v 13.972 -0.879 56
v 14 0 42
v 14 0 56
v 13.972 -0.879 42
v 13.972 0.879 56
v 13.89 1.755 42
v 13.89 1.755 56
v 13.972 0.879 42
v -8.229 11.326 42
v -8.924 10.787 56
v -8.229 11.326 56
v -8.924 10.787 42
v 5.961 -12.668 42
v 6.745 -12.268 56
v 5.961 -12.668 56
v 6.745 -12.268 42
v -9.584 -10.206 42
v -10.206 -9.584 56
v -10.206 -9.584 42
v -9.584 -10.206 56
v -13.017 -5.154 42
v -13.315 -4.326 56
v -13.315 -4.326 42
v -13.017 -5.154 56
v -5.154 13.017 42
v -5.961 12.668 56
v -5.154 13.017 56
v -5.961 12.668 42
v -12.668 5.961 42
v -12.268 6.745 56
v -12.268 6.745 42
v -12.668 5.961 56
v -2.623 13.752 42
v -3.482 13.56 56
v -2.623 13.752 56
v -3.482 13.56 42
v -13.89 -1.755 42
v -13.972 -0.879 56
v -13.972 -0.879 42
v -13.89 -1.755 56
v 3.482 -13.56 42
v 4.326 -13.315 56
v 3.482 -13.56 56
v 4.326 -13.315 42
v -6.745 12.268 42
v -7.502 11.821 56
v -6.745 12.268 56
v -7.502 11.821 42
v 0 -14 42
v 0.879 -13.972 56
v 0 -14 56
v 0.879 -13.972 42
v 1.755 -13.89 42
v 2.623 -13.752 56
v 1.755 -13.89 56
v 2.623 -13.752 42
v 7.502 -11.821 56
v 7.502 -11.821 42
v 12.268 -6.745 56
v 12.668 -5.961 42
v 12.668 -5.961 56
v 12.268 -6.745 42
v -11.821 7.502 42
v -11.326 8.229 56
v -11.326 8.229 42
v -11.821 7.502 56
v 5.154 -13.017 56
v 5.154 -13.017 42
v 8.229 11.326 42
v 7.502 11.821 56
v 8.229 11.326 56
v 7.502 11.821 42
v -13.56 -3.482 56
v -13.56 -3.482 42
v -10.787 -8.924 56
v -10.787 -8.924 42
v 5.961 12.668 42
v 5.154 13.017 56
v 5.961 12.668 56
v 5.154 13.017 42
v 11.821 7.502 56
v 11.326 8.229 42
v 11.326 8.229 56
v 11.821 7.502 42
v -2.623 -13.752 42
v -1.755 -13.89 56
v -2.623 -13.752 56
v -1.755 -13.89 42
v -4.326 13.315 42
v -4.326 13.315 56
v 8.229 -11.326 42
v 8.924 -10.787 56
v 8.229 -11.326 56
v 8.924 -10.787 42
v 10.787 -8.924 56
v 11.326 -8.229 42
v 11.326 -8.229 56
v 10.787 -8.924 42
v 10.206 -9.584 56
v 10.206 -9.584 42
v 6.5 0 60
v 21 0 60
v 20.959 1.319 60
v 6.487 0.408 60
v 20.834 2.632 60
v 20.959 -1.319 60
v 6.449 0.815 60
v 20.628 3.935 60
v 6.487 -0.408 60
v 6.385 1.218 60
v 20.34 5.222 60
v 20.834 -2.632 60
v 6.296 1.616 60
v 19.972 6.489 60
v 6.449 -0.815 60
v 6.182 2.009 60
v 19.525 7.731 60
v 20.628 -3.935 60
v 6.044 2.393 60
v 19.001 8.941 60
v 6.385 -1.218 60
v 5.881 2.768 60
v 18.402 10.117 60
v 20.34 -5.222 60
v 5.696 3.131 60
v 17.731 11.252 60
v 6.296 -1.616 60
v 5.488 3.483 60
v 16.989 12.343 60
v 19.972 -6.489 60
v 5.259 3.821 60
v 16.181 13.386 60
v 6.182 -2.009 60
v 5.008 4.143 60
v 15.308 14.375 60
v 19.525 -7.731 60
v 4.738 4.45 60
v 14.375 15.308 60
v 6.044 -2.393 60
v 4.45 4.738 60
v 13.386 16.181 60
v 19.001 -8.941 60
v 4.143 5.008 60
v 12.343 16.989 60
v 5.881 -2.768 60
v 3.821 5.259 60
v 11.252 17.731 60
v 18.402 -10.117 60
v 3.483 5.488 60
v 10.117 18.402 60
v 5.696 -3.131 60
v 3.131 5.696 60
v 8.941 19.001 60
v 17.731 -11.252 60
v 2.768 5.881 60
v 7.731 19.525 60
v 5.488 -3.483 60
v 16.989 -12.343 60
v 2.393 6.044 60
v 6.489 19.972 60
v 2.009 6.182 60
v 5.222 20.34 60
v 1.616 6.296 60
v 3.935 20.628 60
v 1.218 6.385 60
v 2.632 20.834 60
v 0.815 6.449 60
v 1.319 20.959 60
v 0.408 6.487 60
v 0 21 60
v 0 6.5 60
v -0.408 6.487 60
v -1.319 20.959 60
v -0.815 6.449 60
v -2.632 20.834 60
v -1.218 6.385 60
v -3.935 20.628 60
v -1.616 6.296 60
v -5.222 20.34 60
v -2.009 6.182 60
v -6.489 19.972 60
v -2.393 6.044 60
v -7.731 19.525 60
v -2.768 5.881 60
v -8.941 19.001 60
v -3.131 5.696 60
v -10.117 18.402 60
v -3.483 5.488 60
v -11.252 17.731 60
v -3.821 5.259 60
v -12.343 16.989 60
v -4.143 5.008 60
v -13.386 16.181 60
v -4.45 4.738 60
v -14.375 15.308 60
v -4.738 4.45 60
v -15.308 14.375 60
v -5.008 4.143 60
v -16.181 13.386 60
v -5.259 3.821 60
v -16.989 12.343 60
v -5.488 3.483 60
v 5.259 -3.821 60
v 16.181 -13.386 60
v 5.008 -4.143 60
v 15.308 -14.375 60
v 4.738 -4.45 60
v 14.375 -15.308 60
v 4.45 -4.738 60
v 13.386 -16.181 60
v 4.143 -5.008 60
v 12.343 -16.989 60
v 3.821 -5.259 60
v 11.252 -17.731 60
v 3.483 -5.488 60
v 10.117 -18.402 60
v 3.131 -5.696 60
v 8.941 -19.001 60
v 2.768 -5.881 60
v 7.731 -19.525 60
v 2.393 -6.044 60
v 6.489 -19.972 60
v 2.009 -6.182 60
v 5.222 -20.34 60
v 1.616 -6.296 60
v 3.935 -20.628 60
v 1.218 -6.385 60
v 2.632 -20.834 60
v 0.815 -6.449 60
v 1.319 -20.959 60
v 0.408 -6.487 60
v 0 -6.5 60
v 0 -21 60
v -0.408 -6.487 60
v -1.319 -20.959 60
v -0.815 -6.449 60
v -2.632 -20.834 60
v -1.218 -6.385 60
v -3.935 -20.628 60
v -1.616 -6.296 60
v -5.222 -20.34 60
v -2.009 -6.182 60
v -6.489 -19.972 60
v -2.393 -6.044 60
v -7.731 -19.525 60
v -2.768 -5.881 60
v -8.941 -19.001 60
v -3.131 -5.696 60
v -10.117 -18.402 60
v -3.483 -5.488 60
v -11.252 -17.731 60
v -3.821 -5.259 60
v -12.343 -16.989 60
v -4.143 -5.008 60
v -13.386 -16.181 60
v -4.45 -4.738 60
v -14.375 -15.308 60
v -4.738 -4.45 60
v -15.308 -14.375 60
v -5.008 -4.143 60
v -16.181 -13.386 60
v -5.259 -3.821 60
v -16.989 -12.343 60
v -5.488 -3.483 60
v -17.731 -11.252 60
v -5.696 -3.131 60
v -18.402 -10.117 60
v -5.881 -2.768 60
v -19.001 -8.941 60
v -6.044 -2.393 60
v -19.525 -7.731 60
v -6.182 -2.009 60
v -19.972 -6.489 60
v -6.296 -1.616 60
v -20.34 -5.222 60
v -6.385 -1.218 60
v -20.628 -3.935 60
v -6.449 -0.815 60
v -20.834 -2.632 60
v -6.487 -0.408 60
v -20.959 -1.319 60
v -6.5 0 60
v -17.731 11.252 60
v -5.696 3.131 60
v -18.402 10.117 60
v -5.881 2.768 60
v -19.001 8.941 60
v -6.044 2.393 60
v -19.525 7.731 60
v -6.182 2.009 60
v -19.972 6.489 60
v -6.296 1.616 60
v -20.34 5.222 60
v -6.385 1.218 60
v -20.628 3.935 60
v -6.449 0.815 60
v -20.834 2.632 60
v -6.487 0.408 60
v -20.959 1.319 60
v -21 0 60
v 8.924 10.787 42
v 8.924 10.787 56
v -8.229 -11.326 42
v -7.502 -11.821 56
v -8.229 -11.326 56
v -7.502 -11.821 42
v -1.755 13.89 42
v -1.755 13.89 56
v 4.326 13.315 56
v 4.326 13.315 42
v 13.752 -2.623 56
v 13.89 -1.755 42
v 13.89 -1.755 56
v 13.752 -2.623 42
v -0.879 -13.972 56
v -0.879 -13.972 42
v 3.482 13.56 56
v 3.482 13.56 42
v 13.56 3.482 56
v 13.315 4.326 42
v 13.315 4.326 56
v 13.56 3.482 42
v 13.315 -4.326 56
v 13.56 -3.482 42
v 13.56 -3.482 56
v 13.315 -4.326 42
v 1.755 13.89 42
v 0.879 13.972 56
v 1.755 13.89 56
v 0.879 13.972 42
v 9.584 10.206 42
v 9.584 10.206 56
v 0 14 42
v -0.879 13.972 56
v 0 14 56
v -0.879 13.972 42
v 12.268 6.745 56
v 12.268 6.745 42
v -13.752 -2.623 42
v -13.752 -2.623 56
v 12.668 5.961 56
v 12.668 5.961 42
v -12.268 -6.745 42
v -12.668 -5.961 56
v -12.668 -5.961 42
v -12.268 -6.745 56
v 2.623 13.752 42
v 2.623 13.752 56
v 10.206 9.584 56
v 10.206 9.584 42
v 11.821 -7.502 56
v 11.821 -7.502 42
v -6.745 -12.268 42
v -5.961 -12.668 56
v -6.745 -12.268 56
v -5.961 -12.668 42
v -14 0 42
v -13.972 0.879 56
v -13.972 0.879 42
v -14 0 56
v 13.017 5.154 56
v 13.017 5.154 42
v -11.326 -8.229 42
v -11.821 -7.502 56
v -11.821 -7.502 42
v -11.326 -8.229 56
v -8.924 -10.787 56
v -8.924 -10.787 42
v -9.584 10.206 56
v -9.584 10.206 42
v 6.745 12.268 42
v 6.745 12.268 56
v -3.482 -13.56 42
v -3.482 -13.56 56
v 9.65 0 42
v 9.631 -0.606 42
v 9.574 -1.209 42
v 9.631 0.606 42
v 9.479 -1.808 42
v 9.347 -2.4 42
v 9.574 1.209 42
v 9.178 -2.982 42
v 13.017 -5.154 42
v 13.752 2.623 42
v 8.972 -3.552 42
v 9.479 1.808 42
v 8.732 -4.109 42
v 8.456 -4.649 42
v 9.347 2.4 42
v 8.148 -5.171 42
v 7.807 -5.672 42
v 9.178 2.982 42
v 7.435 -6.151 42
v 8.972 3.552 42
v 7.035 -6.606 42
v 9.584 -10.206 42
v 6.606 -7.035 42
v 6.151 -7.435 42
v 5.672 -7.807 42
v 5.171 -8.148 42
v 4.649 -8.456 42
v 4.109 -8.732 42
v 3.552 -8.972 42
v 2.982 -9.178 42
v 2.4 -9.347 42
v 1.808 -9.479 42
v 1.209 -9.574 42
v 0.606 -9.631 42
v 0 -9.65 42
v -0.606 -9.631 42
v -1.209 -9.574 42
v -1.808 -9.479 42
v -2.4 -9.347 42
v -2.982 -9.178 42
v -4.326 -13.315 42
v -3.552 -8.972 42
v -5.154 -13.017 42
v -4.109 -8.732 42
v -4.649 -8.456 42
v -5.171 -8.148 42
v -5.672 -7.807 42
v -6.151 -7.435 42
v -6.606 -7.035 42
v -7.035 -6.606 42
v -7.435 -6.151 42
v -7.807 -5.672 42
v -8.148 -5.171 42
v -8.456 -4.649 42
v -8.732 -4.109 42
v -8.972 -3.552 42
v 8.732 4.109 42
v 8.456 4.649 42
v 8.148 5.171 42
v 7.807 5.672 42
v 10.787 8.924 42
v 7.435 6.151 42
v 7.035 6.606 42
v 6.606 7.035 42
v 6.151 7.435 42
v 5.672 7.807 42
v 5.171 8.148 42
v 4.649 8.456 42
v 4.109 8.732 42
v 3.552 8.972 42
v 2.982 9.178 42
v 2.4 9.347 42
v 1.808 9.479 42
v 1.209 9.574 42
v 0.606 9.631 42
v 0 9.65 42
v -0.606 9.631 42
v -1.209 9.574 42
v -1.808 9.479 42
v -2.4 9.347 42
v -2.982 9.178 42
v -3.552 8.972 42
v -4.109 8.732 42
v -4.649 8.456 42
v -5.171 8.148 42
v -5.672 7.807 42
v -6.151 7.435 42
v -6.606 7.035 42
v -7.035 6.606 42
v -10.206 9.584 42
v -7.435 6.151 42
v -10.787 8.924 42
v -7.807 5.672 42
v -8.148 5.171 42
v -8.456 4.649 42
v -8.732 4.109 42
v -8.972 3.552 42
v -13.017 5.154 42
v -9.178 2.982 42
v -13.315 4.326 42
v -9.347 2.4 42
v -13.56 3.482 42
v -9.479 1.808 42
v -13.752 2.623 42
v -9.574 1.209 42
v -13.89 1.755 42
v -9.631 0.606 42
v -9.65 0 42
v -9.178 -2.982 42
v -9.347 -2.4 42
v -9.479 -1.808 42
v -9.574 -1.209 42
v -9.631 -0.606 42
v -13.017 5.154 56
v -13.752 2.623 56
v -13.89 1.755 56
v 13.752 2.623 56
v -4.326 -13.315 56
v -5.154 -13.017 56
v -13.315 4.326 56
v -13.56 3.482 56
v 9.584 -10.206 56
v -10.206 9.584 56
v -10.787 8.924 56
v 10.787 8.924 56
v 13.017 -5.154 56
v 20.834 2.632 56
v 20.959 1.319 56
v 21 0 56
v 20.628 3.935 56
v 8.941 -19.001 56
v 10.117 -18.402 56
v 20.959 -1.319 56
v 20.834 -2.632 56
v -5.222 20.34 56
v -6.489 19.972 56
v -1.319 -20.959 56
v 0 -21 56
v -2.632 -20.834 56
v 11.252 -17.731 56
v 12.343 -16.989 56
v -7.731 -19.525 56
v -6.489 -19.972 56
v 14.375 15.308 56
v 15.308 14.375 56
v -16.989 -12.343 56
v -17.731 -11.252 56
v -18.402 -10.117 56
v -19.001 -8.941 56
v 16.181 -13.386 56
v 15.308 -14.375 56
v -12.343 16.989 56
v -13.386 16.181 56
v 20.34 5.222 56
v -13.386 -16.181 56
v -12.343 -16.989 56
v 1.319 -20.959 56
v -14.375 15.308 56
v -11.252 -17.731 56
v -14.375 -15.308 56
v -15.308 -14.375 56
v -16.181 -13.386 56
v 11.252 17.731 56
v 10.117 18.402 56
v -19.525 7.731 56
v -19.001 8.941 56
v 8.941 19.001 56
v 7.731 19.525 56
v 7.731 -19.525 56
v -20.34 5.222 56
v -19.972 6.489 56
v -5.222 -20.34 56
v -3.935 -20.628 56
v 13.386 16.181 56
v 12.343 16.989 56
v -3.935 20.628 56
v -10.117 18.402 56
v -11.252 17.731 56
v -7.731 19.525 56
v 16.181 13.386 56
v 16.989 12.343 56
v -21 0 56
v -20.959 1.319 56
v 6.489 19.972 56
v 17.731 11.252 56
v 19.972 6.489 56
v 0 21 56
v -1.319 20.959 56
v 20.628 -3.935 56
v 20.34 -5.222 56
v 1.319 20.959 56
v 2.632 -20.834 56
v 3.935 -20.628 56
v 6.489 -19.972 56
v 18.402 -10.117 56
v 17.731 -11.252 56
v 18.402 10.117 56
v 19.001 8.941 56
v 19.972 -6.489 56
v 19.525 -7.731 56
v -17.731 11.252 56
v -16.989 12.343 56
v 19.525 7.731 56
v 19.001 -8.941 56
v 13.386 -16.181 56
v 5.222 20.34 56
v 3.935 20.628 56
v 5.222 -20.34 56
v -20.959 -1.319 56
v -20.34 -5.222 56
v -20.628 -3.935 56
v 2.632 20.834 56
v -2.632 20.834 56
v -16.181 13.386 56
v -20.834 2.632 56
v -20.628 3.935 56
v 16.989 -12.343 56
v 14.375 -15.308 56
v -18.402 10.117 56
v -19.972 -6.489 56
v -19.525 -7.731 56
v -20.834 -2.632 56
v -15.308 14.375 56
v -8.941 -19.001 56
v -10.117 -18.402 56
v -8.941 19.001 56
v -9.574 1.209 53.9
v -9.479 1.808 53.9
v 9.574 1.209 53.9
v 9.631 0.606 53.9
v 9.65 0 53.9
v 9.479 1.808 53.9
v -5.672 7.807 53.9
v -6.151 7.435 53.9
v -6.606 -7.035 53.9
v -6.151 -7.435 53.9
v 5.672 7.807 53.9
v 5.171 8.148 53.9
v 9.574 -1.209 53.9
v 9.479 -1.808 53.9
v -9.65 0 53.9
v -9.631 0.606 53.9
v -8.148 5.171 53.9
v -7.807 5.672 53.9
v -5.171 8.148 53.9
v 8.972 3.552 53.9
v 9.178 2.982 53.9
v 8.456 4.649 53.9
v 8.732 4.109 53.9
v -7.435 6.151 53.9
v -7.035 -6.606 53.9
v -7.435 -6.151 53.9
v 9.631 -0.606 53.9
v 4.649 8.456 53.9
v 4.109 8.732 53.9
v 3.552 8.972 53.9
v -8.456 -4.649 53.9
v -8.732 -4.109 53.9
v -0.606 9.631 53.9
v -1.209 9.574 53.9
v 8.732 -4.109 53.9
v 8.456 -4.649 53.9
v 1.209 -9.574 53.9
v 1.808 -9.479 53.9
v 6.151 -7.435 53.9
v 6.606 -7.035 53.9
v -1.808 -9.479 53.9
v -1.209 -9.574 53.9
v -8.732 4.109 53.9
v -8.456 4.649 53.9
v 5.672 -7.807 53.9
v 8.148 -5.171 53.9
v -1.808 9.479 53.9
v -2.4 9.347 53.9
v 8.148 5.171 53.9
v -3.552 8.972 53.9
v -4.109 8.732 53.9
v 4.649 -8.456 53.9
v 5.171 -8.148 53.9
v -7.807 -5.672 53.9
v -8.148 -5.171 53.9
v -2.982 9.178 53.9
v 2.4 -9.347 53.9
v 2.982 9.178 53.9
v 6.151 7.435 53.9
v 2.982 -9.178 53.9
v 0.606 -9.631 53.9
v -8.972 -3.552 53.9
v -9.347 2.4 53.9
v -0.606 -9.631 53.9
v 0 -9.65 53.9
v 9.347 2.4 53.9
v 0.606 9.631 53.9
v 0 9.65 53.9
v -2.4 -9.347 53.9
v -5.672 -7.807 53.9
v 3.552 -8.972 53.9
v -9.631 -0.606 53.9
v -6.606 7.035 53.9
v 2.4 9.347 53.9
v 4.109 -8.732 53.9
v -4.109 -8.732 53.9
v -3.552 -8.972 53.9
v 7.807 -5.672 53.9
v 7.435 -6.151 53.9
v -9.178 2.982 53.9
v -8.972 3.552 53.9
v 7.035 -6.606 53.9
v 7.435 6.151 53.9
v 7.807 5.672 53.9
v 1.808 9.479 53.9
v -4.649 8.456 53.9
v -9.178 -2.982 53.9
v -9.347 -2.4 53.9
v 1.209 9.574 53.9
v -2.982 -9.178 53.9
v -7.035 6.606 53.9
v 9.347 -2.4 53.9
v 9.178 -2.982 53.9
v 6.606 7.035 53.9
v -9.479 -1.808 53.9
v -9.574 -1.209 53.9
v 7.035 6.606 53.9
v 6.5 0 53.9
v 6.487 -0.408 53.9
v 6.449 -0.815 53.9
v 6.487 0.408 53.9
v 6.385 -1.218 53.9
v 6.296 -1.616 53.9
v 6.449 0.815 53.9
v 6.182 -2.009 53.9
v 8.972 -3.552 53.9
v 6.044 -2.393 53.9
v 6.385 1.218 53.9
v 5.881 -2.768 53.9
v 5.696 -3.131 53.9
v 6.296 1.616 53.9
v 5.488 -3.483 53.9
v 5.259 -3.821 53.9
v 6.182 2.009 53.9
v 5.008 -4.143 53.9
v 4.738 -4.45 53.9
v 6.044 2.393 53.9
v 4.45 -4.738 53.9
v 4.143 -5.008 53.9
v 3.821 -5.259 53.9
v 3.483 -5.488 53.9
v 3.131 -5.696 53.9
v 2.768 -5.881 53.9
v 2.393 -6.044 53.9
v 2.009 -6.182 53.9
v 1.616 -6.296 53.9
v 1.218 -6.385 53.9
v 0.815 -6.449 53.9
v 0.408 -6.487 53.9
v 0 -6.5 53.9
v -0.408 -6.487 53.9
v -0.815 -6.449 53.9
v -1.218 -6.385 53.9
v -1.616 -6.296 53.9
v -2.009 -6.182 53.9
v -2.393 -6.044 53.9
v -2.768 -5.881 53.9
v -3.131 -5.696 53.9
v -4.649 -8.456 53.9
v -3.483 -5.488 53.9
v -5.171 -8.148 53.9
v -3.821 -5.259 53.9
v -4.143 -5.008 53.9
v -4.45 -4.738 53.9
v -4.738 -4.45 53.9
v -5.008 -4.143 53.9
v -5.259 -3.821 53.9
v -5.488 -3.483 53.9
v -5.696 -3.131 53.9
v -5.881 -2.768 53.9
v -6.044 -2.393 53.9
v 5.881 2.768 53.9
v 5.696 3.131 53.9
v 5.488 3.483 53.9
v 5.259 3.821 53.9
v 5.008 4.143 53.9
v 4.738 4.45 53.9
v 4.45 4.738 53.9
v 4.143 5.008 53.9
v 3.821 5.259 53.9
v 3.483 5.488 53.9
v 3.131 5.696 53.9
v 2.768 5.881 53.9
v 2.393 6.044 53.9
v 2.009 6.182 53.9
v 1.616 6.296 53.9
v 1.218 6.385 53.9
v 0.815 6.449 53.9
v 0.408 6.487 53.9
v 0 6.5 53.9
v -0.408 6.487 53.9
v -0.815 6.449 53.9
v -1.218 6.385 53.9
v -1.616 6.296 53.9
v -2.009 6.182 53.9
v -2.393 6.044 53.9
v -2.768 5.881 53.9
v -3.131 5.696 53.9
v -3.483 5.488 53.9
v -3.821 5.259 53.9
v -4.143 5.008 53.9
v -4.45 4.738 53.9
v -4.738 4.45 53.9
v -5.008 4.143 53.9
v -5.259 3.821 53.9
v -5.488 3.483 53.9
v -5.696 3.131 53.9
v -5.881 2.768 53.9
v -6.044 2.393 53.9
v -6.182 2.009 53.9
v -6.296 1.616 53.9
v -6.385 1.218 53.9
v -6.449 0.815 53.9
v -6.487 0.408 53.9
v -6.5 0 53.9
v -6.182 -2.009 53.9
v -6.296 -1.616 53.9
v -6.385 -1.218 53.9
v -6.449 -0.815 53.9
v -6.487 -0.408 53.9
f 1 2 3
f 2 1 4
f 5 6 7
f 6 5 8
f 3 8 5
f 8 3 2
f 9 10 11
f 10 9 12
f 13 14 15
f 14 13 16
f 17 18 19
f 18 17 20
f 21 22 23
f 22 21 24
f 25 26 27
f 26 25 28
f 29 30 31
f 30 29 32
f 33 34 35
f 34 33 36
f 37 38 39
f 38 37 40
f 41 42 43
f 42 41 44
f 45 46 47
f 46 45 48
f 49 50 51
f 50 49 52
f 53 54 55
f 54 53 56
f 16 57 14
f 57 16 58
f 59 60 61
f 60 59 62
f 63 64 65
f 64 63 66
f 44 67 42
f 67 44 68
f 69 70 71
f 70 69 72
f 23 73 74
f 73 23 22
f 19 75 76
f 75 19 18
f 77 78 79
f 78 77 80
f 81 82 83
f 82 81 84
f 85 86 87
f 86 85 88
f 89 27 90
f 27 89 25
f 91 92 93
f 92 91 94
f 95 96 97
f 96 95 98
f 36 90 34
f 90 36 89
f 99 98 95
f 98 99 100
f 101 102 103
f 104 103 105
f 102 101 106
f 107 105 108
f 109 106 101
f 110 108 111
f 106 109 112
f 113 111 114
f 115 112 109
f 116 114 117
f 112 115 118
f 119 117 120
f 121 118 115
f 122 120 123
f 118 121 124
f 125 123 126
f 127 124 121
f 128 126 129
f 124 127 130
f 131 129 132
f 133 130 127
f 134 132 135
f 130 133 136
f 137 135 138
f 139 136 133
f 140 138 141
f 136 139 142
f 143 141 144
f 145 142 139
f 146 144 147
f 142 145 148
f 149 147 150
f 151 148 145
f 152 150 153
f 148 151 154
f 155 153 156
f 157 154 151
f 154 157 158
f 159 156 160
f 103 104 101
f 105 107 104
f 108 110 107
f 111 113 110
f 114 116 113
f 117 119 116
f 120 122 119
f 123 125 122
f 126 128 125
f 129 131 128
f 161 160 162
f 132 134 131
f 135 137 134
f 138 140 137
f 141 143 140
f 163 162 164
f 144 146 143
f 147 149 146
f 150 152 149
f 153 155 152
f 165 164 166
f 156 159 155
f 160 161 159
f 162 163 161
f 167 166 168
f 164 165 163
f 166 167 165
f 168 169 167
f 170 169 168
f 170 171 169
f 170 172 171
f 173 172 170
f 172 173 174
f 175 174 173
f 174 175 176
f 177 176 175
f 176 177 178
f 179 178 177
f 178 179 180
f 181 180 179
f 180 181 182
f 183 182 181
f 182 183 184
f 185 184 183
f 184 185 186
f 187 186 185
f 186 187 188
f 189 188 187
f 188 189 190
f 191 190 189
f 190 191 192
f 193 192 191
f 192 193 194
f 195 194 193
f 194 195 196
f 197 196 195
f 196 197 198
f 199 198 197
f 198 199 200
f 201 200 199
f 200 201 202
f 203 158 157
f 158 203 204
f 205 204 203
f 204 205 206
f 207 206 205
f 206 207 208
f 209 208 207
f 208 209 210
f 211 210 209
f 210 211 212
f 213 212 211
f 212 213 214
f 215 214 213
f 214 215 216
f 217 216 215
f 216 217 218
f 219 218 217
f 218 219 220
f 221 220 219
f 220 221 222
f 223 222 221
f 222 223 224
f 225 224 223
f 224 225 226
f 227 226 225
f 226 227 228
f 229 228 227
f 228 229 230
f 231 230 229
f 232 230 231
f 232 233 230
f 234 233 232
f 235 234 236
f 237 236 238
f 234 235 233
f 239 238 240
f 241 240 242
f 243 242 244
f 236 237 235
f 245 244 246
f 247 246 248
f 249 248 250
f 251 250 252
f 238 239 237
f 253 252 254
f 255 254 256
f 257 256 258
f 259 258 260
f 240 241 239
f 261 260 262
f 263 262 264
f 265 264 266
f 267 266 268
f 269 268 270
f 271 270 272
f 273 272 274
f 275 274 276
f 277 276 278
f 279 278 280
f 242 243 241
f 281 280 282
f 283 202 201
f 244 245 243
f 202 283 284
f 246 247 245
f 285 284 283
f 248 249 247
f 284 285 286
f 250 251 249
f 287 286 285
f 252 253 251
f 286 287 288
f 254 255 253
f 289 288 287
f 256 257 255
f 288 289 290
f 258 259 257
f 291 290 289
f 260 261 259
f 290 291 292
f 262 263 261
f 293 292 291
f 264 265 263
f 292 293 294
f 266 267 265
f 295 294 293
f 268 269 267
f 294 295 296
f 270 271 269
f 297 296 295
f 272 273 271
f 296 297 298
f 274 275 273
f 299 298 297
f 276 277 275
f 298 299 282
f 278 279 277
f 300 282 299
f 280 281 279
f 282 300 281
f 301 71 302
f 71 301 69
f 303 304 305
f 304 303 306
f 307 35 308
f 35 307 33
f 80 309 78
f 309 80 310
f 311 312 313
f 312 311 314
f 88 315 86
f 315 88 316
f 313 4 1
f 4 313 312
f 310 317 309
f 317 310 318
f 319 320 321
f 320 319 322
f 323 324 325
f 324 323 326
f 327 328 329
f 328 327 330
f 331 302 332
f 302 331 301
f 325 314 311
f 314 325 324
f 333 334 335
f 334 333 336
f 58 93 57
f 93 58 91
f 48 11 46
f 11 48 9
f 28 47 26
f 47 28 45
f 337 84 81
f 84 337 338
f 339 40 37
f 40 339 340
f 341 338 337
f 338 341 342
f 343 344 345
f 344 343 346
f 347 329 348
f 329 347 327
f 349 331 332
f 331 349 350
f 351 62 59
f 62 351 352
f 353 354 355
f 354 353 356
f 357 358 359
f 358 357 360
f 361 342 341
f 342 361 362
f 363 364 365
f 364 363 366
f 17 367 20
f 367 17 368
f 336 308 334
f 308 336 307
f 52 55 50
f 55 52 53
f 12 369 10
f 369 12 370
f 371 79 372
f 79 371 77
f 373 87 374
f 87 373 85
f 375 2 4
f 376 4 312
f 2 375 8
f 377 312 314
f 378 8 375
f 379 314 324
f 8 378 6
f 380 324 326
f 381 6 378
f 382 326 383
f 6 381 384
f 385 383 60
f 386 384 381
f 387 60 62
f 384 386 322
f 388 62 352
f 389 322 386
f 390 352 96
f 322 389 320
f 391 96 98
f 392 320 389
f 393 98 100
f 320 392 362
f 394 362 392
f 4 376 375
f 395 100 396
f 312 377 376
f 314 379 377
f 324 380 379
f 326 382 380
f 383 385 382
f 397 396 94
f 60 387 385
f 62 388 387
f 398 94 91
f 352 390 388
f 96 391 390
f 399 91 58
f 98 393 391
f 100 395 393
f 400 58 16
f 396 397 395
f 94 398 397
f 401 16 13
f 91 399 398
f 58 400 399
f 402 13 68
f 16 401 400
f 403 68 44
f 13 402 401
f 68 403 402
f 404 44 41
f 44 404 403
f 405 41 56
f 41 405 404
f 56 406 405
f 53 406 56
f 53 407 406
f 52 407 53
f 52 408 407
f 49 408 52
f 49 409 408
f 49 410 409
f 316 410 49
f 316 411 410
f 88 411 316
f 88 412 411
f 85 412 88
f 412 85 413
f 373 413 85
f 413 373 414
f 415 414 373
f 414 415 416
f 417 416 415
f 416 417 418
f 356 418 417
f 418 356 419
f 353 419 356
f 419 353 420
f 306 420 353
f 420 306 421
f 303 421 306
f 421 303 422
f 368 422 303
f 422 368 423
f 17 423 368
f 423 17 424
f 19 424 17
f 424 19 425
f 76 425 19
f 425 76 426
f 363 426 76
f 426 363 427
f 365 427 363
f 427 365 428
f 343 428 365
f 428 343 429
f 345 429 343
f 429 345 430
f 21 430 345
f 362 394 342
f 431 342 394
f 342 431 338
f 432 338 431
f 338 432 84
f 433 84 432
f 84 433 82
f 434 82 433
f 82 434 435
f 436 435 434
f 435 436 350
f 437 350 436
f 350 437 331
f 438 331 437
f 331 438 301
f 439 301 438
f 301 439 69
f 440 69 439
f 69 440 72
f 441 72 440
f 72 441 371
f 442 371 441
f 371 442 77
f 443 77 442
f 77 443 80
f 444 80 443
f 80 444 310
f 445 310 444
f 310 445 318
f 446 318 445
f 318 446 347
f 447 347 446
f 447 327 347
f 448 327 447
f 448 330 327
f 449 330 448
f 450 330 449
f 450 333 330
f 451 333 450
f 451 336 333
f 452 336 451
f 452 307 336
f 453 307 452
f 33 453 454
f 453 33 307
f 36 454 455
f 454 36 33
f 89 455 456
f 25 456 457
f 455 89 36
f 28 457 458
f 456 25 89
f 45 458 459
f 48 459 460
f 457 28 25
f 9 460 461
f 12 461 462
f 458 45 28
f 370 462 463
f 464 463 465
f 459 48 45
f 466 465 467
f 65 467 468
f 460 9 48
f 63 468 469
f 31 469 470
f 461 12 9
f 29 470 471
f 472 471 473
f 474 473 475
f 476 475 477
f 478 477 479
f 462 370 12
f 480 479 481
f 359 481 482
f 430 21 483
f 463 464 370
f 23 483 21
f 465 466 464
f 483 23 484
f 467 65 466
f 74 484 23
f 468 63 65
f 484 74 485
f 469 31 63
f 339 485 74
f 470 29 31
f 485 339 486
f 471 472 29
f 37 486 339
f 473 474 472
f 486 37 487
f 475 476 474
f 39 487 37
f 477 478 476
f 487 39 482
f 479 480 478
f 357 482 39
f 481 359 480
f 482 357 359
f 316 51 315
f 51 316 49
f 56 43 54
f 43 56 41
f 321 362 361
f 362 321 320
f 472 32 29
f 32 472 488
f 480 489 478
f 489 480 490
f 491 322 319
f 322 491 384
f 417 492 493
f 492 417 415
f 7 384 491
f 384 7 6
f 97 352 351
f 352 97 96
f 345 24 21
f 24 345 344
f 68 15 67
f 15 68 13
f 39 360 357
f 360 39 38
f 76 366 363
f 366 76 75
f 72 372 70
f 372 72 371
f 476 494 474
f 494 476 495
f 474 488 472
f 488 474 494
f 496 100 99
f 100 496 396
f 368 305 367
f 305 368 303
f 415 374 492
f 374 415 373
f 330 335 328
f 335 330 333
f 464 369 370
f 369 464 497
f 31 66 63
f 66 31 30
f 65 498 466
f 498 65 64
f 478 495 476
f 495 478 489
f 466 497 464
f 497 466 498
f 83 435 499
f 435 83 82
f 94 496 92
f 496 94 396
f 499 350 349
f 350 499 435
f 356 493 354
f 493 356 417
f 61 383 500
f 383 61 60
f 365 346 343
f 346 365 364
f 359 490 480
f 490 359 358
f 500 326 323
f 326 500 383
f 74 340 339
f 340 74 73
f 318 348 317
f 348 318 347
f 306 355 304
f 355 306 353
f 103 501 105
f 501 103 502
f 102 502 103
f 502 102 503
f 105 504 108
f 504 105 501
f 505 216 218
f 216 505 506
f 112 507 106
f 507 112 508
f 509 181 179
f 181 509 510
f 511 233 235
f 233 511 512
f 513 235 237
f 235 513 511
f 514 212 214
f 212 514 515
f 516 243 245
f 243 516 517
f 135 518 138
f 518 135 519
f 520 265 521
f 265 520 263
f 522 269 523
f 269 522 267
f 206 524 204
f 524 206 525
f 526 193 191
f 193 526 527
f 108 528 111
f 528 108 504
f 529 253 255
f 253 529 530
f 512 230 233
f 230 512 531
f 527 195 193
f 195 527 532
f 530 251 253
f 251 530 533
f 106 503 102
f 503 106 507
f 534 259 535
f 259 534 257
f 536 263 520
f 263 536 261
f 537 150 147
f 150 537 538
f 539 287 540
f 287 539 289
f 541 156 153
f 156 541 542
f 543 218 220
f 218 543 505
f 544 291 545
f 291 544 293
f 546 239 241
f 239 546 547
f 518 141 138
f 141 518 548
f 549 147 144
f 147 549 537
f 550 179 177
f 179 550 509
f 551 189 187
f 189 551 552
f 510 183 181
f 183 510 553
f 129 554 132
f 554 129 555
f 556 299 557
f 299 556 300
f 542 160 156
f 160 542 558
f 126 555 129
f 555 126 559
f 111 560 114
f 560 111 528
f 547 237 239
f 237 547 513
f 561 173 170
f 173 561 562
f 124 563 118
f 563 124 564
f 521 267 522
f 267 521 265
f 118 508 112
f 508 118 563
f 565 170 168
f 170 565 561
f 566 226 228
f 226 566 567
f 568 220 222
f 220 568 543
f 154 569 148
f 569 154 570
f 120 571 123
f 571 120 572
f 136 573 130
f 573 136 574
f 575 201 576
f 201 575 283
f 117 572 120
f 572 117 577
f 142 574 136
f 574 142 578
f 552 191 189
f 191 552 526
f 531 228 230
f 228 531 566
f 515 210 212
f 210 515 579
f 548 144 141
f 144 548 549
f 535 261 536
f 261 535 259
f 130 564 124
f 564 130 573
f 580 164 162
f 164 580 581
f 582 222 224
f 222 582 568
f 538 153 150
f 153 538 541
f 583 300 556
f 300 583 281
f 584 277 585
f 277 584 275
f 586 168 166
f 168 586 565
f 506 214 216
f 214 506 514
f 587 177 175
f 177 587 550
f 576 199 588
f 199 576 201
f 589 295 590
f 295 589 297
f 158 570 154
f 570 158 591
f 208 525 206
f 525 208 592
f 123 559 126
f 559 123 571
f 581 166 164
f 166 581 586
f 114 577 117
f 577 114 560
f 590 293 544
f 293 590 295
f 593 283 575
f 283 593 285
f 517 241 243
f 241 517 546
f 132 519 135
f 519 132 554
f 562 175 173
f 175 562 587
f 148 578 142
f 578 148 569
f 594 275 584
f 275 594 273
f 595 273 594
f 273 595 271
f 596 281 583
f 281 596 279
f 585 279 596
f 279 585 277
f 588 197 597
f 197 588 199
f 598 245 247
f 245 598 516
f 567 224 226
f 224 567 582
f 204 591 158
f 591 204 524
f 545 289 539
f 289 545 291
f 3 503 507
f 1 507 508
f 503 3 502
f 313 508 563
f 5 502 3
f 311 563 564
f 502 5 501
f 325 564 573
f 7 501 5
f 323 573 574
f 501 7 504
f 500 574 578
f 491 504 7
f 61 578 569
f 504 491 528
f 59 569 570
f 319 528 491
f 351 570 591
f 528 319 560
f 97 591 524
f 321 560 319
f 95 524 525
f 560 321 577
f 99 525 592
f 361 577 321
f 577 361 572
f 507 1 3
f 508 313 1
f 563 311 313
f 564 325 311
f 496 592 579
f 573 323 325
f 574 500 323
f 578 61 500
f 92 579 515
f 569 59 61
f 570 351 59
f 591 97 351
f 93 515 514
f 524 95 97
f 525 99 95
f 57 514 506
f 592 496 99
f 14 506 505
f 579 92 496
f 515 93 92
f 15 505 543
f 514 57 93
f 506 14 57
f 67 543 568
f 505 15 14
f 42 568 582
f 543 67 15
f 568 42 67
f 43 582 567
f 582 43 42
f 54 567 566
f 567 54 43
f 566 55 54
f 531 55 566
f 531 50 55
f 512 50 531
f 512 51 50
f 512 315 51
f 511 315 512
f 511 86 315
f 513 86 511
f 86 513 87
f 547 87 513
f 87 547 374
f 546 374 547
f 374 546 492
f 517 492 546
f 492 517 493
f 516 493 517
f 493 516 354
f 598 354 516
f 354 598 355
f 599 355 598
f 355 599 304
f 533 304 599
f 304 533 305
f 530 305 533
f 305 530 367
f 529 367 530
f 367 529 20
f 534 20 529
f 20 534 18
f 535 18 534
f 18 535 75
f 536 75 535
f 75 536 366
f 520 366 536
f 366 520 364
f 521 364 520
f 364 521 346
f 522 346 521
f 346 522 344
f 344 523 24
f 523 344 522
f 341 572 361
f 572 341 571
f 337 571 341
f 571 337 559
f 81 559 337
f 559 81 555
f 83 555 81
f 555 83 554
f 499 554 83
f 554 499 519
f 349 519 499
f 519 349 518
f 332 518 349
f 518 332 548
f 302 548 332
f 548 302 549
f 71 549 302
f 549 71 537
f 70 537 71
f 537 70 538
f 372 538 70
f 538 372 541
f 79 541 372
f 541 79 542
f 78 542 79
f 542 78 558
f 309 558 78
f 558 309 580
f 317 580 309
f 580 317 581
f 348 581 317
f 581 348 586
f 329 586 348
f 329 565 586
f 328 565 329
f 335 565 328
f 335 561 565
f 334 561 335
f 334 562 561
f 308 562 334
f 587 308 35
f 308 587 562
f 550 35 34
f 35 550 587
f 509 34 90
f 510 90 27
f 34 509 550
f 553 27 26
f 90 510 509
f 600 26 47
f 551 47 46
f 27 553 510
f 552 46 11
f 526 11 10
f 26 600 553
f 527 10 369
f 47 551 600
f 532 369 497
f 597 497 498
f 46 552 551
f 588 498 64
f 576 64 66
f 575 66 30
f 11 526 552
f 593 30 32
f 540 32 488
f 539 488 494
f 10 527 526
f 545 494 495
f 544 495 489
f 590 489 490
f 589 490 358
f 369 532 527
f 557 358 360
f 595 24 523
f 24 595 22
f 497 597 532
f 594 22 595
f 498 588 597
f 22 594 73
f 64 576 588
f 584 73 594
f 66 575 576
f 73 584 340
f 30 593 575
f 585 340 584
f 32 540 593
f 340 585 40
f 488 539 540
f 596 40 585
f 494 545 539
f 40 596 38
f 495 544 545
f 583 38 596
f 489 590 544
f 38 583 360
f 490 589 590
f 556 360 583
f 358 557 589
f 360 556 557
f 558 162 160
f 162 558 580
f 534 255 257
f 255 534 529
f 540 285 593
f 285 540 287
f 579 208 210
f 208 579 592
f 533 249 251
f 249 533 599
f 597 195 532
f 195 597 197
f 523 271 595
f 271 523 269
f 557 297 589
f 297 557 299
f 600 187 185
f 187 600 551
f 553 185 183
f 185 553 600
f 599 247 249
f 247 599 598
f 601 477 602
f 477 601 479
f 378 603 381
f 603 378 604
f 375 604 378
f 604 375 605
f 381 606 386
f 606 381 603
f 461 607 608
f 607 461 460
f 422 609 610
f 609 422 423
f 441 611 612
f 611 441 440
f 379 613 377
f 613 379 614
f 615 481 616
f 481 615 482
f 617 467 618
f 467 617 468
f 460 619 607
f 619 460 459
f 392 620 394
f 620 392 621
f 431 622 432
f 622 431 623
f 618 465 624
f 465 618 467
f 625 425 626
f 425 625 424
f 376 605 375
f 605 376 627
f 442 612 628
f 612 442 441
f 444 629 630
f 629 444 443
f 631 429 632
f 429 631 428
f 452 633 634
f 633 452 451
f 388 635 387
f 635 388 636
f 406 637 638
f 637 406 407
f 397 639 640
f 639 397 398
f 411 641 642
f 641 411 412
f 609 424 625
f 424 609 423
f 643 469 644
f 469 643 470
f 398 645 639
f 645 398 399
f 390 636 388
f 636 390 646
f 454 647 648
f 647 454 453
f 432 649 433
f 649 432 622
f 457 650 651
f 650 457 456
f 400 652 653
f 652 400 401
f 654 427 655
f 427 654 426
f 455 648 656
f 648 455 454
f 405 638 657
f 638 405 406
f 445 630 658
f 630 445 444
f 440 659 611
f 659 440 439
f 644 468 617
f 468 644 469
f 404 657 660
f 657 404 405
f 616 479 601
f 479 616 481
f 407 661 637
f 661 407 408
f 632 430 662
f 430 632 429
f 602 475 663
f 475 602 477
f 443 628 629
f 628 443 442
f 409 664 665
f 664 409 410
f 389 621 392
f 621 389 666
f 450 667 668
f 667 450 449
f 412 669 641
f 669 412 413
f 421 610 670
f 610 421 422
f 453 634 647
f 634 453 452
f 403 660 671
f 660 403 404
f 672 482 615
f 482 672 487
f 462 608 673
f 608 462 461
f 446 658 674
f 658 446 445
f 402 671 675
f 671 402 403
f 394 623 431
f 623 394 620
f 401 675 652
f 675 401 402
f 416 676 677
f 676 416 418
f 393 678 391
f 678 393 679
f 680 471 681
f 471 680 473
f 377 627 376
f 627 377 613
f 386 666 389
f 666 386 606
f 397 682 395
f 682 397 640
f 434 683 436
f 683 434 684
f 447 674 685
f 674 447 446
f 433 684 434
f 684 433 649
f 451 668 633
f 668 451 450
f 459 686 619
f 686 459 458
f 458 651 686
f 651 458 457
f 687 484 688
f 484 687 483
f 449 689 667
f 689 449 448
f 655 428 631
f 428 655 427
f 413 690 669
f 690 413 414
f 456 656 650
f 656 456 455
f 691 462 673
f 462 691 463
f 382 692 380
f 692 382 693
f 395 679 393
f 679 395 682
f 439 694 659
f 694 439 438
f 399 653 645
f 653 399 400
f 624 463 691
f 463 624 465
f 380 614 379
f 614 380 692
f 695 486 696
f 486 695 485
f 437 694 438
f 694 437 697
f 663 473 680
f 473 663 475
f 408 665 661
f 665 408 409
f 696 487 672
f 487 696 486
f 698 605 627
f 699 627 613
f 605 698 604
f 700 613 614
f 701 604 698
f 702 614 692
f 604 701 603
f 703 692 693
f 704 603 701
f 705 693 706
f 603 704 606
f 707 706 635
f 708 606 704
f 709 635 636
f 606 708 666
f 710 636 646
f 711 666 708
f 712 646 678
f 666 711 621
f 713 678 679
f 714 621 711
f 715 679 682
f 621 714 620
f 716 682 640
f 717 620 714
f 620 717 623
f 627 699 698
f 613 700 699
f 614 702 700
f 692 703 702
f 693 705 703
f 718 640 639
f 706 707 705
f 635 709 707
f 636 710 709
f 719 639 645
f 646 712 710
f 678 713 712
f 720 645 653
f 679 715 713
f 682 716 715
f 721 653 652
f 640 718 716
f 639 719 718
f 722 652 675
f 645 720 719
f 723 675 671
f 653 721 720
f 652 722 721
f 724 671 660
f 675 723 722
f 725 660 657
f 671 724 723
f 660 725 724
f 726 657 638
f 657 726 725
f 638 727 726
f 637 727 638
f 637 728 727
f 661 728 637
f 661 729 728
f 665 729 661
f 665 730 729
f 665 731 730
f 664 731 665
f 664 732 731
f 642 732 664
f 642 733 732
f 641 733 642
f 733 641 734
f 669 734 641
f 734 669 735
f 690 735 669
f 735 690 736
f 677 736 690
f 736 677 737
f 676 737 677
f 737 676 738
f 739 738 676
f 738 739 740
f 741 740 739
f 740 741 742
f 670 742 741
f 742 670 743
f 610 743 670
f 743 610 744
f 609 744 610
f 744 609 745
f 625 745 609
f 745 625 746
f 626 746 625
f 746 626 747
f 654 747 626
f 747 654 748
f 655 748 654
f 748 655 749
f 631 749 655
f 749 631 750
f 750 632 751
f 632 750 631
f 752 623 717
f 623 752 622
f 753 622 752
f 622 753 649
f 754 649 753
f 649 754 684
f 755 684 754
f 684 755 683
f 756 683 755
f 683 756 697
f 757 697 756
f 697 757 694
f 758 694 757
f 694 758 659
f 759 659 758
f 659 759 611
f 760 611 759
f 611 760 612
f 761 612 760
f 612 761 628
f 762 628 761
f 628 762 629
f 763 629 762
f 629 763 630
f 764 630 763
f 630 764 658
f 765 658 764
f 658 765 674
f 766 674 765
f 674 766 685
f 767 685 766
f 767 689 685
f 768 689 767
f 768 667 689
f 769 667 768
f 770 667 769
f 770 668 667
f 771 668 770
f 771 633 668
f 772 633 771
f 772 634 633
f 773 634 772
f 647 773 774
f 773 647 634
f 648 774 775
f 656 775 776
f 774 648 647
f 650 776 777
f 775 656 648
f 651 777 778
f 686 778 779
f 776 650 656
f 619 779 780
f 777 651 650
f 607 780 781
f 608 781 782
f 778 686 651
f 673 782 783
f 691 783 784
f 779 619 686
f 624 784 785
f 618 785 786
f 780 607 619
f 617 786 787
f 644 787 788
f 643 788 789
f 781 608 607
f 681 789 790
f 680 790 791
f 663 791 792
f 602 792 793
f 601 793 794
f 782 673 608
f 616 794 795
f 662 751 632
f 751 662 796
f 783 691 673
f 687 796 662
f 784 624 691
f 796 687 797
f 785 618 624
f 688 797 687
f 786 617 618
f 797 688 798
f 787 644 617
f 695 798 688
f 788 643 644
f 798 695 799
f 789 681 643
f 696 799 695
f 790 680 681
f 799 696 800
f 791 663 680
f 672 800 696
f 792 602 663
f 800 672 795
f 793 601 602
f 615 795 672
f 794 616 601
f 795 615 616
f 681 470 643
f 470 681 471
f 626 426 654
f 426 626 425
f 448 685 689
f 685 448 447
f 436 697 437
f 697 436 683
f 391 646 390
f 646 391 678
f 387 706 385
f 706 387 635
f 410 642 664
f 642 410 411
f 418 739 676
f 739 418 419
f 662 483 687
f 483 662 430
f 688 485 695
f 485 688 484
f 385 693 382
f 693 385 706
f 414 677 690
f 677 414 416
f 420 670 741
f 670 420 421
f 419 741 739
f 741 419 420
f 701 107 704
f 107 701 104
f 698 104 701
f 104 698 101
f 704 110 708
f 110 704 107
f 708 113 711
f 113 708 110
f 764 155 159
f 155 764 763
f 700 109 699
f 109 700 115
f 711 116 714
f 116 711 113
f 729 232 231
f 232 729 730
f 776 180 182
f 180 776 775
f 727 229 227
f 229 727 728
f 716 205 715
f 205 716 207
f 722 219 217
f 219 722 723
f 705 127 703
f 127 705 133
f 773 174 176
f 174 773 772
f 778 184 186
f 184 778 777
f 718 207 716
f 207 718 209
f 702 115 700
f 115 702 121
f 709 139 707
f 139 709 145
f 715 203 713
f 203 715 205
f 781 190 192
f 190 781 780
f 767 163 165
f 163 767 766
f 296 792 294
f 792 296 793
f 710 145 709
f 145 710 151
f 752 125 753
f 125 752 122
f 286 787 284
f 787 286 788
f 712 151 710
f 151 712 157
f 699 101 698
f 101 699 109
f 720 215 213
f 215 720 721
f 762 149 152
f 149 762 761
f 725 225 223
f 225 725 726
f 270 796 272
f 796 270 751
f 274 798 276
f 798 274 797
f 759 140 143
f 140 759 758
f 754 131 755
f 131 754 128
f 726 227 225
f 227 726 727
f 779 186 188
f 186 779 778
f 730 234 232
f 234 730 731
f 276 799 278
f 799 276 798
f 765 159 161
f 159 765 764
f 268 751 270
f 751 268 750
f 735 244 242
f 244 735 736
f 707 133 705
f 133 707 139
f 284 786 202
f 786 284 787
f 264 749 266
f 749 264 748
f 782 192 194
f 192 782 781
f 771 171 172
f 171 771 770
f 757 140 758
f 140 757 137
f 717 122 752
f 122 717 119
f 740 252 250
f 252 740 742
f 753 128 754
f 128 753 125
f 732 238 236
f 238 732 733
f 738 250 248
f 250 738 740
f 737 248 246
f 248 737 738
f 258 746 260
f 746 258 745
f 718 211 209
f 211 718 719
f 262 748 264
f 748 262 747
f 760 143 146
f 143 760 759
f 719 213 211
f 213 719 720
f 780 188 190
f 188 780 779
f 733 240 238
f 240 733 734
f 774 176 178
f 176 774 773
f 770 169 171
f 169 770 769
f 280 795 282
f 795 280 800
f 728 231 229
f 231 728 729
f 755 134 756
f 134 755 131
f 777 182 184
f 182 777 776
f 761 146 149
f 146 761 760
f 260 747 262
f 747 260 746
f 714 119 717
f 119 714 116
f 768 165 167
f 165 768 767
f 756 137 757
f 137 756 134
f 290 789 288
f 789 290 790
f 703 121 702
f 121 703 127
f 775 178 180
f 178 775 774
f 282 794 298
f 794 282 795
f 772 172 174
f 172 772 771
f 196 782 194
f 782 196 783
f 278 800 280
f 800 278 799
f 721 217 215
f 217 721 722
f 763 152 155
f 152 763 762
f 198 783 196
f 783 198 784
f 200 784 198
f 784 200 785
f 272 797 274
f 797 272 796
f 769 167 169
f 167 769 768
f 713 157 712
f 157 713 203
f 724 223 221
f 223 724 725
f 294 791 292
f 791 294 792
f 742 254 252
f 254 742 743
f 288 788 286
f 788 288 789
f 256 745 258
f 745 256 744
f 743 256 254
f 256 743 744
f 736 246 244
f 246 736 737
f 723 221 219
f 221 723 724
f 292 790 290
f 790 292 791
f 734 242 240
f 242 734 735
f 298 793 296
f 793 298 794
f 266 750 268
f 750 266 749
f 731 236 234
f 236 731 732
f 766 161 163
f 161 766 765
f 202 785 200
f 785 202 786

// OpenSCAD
$fn=100;

module shaft(){
shaft_d = 3.2;
translate([0,0,11 + 5])
mirror([0,0,1]) difference() {
    hole_d = 12;
    _h = 5;
    union (){
        difference() {
            cylinder(h=_h+6,r=7);
            translate([0,0,-0.01])
            intersection() {
                cylinder(h = _h, r = 8.1/2);
                cube([5.9,8.1,_h*2], center = true);
            }
        }
    }
    
    translate([0,0,-5]) cylinder(h = 40, r = shaft_d/2);
}
}

h_offset=15;
h1=h_offset+7+40;
inner_d=36;
outer_d=42;
inner_d2=inner_d-7;
module box(){
//
translate([0,0,-h_offset])
difference(){
    cylinder(h=h1,d=outer_d);
    translate([0,0,-0.1])
    cylinder(h=h_offset+0.2,d=inner_d);
    translate([0,0,0.1]) cylinder(h=h1,d=inner_d2);
}
difference(){
    cylinder(h=4,d=inner_d+1);
    _h=4.2;
    _d=3.5;
    translate([0,0,-0.1])   cylinder(h=_h,d=16);
    translate([13,0,-0.1])  cylinder(h=_h,d=_d);
    translate([0,13,-0.1])  cylinder(h=_h,d=_d);
    translate([-13,0,-0.1]) cylinder(h=_h,d=_d);
    translate([0,-13,-0.1]) cylinder(h=_h,d=_d);
}
//
}

module cap() {
//
translate([0,0,h1-20])
difference(){
    _h1=14;
    _h2=4;
    union(){
        cylinder(h=_h1+_h2,d=inner_d2-1);
        translate([0,0,_h1])cylinder(h=_h2,d=outer_d);
    }
    translate([0,0,-0.1])cylinder(h=12,d=19.3);
    cylinder(h=50,d=13);
}
//
}

difference(){
    union(){
        //shaft();
        //box();
        cap();
    }
    //translate([0,0,-50]) cube(200);
}
